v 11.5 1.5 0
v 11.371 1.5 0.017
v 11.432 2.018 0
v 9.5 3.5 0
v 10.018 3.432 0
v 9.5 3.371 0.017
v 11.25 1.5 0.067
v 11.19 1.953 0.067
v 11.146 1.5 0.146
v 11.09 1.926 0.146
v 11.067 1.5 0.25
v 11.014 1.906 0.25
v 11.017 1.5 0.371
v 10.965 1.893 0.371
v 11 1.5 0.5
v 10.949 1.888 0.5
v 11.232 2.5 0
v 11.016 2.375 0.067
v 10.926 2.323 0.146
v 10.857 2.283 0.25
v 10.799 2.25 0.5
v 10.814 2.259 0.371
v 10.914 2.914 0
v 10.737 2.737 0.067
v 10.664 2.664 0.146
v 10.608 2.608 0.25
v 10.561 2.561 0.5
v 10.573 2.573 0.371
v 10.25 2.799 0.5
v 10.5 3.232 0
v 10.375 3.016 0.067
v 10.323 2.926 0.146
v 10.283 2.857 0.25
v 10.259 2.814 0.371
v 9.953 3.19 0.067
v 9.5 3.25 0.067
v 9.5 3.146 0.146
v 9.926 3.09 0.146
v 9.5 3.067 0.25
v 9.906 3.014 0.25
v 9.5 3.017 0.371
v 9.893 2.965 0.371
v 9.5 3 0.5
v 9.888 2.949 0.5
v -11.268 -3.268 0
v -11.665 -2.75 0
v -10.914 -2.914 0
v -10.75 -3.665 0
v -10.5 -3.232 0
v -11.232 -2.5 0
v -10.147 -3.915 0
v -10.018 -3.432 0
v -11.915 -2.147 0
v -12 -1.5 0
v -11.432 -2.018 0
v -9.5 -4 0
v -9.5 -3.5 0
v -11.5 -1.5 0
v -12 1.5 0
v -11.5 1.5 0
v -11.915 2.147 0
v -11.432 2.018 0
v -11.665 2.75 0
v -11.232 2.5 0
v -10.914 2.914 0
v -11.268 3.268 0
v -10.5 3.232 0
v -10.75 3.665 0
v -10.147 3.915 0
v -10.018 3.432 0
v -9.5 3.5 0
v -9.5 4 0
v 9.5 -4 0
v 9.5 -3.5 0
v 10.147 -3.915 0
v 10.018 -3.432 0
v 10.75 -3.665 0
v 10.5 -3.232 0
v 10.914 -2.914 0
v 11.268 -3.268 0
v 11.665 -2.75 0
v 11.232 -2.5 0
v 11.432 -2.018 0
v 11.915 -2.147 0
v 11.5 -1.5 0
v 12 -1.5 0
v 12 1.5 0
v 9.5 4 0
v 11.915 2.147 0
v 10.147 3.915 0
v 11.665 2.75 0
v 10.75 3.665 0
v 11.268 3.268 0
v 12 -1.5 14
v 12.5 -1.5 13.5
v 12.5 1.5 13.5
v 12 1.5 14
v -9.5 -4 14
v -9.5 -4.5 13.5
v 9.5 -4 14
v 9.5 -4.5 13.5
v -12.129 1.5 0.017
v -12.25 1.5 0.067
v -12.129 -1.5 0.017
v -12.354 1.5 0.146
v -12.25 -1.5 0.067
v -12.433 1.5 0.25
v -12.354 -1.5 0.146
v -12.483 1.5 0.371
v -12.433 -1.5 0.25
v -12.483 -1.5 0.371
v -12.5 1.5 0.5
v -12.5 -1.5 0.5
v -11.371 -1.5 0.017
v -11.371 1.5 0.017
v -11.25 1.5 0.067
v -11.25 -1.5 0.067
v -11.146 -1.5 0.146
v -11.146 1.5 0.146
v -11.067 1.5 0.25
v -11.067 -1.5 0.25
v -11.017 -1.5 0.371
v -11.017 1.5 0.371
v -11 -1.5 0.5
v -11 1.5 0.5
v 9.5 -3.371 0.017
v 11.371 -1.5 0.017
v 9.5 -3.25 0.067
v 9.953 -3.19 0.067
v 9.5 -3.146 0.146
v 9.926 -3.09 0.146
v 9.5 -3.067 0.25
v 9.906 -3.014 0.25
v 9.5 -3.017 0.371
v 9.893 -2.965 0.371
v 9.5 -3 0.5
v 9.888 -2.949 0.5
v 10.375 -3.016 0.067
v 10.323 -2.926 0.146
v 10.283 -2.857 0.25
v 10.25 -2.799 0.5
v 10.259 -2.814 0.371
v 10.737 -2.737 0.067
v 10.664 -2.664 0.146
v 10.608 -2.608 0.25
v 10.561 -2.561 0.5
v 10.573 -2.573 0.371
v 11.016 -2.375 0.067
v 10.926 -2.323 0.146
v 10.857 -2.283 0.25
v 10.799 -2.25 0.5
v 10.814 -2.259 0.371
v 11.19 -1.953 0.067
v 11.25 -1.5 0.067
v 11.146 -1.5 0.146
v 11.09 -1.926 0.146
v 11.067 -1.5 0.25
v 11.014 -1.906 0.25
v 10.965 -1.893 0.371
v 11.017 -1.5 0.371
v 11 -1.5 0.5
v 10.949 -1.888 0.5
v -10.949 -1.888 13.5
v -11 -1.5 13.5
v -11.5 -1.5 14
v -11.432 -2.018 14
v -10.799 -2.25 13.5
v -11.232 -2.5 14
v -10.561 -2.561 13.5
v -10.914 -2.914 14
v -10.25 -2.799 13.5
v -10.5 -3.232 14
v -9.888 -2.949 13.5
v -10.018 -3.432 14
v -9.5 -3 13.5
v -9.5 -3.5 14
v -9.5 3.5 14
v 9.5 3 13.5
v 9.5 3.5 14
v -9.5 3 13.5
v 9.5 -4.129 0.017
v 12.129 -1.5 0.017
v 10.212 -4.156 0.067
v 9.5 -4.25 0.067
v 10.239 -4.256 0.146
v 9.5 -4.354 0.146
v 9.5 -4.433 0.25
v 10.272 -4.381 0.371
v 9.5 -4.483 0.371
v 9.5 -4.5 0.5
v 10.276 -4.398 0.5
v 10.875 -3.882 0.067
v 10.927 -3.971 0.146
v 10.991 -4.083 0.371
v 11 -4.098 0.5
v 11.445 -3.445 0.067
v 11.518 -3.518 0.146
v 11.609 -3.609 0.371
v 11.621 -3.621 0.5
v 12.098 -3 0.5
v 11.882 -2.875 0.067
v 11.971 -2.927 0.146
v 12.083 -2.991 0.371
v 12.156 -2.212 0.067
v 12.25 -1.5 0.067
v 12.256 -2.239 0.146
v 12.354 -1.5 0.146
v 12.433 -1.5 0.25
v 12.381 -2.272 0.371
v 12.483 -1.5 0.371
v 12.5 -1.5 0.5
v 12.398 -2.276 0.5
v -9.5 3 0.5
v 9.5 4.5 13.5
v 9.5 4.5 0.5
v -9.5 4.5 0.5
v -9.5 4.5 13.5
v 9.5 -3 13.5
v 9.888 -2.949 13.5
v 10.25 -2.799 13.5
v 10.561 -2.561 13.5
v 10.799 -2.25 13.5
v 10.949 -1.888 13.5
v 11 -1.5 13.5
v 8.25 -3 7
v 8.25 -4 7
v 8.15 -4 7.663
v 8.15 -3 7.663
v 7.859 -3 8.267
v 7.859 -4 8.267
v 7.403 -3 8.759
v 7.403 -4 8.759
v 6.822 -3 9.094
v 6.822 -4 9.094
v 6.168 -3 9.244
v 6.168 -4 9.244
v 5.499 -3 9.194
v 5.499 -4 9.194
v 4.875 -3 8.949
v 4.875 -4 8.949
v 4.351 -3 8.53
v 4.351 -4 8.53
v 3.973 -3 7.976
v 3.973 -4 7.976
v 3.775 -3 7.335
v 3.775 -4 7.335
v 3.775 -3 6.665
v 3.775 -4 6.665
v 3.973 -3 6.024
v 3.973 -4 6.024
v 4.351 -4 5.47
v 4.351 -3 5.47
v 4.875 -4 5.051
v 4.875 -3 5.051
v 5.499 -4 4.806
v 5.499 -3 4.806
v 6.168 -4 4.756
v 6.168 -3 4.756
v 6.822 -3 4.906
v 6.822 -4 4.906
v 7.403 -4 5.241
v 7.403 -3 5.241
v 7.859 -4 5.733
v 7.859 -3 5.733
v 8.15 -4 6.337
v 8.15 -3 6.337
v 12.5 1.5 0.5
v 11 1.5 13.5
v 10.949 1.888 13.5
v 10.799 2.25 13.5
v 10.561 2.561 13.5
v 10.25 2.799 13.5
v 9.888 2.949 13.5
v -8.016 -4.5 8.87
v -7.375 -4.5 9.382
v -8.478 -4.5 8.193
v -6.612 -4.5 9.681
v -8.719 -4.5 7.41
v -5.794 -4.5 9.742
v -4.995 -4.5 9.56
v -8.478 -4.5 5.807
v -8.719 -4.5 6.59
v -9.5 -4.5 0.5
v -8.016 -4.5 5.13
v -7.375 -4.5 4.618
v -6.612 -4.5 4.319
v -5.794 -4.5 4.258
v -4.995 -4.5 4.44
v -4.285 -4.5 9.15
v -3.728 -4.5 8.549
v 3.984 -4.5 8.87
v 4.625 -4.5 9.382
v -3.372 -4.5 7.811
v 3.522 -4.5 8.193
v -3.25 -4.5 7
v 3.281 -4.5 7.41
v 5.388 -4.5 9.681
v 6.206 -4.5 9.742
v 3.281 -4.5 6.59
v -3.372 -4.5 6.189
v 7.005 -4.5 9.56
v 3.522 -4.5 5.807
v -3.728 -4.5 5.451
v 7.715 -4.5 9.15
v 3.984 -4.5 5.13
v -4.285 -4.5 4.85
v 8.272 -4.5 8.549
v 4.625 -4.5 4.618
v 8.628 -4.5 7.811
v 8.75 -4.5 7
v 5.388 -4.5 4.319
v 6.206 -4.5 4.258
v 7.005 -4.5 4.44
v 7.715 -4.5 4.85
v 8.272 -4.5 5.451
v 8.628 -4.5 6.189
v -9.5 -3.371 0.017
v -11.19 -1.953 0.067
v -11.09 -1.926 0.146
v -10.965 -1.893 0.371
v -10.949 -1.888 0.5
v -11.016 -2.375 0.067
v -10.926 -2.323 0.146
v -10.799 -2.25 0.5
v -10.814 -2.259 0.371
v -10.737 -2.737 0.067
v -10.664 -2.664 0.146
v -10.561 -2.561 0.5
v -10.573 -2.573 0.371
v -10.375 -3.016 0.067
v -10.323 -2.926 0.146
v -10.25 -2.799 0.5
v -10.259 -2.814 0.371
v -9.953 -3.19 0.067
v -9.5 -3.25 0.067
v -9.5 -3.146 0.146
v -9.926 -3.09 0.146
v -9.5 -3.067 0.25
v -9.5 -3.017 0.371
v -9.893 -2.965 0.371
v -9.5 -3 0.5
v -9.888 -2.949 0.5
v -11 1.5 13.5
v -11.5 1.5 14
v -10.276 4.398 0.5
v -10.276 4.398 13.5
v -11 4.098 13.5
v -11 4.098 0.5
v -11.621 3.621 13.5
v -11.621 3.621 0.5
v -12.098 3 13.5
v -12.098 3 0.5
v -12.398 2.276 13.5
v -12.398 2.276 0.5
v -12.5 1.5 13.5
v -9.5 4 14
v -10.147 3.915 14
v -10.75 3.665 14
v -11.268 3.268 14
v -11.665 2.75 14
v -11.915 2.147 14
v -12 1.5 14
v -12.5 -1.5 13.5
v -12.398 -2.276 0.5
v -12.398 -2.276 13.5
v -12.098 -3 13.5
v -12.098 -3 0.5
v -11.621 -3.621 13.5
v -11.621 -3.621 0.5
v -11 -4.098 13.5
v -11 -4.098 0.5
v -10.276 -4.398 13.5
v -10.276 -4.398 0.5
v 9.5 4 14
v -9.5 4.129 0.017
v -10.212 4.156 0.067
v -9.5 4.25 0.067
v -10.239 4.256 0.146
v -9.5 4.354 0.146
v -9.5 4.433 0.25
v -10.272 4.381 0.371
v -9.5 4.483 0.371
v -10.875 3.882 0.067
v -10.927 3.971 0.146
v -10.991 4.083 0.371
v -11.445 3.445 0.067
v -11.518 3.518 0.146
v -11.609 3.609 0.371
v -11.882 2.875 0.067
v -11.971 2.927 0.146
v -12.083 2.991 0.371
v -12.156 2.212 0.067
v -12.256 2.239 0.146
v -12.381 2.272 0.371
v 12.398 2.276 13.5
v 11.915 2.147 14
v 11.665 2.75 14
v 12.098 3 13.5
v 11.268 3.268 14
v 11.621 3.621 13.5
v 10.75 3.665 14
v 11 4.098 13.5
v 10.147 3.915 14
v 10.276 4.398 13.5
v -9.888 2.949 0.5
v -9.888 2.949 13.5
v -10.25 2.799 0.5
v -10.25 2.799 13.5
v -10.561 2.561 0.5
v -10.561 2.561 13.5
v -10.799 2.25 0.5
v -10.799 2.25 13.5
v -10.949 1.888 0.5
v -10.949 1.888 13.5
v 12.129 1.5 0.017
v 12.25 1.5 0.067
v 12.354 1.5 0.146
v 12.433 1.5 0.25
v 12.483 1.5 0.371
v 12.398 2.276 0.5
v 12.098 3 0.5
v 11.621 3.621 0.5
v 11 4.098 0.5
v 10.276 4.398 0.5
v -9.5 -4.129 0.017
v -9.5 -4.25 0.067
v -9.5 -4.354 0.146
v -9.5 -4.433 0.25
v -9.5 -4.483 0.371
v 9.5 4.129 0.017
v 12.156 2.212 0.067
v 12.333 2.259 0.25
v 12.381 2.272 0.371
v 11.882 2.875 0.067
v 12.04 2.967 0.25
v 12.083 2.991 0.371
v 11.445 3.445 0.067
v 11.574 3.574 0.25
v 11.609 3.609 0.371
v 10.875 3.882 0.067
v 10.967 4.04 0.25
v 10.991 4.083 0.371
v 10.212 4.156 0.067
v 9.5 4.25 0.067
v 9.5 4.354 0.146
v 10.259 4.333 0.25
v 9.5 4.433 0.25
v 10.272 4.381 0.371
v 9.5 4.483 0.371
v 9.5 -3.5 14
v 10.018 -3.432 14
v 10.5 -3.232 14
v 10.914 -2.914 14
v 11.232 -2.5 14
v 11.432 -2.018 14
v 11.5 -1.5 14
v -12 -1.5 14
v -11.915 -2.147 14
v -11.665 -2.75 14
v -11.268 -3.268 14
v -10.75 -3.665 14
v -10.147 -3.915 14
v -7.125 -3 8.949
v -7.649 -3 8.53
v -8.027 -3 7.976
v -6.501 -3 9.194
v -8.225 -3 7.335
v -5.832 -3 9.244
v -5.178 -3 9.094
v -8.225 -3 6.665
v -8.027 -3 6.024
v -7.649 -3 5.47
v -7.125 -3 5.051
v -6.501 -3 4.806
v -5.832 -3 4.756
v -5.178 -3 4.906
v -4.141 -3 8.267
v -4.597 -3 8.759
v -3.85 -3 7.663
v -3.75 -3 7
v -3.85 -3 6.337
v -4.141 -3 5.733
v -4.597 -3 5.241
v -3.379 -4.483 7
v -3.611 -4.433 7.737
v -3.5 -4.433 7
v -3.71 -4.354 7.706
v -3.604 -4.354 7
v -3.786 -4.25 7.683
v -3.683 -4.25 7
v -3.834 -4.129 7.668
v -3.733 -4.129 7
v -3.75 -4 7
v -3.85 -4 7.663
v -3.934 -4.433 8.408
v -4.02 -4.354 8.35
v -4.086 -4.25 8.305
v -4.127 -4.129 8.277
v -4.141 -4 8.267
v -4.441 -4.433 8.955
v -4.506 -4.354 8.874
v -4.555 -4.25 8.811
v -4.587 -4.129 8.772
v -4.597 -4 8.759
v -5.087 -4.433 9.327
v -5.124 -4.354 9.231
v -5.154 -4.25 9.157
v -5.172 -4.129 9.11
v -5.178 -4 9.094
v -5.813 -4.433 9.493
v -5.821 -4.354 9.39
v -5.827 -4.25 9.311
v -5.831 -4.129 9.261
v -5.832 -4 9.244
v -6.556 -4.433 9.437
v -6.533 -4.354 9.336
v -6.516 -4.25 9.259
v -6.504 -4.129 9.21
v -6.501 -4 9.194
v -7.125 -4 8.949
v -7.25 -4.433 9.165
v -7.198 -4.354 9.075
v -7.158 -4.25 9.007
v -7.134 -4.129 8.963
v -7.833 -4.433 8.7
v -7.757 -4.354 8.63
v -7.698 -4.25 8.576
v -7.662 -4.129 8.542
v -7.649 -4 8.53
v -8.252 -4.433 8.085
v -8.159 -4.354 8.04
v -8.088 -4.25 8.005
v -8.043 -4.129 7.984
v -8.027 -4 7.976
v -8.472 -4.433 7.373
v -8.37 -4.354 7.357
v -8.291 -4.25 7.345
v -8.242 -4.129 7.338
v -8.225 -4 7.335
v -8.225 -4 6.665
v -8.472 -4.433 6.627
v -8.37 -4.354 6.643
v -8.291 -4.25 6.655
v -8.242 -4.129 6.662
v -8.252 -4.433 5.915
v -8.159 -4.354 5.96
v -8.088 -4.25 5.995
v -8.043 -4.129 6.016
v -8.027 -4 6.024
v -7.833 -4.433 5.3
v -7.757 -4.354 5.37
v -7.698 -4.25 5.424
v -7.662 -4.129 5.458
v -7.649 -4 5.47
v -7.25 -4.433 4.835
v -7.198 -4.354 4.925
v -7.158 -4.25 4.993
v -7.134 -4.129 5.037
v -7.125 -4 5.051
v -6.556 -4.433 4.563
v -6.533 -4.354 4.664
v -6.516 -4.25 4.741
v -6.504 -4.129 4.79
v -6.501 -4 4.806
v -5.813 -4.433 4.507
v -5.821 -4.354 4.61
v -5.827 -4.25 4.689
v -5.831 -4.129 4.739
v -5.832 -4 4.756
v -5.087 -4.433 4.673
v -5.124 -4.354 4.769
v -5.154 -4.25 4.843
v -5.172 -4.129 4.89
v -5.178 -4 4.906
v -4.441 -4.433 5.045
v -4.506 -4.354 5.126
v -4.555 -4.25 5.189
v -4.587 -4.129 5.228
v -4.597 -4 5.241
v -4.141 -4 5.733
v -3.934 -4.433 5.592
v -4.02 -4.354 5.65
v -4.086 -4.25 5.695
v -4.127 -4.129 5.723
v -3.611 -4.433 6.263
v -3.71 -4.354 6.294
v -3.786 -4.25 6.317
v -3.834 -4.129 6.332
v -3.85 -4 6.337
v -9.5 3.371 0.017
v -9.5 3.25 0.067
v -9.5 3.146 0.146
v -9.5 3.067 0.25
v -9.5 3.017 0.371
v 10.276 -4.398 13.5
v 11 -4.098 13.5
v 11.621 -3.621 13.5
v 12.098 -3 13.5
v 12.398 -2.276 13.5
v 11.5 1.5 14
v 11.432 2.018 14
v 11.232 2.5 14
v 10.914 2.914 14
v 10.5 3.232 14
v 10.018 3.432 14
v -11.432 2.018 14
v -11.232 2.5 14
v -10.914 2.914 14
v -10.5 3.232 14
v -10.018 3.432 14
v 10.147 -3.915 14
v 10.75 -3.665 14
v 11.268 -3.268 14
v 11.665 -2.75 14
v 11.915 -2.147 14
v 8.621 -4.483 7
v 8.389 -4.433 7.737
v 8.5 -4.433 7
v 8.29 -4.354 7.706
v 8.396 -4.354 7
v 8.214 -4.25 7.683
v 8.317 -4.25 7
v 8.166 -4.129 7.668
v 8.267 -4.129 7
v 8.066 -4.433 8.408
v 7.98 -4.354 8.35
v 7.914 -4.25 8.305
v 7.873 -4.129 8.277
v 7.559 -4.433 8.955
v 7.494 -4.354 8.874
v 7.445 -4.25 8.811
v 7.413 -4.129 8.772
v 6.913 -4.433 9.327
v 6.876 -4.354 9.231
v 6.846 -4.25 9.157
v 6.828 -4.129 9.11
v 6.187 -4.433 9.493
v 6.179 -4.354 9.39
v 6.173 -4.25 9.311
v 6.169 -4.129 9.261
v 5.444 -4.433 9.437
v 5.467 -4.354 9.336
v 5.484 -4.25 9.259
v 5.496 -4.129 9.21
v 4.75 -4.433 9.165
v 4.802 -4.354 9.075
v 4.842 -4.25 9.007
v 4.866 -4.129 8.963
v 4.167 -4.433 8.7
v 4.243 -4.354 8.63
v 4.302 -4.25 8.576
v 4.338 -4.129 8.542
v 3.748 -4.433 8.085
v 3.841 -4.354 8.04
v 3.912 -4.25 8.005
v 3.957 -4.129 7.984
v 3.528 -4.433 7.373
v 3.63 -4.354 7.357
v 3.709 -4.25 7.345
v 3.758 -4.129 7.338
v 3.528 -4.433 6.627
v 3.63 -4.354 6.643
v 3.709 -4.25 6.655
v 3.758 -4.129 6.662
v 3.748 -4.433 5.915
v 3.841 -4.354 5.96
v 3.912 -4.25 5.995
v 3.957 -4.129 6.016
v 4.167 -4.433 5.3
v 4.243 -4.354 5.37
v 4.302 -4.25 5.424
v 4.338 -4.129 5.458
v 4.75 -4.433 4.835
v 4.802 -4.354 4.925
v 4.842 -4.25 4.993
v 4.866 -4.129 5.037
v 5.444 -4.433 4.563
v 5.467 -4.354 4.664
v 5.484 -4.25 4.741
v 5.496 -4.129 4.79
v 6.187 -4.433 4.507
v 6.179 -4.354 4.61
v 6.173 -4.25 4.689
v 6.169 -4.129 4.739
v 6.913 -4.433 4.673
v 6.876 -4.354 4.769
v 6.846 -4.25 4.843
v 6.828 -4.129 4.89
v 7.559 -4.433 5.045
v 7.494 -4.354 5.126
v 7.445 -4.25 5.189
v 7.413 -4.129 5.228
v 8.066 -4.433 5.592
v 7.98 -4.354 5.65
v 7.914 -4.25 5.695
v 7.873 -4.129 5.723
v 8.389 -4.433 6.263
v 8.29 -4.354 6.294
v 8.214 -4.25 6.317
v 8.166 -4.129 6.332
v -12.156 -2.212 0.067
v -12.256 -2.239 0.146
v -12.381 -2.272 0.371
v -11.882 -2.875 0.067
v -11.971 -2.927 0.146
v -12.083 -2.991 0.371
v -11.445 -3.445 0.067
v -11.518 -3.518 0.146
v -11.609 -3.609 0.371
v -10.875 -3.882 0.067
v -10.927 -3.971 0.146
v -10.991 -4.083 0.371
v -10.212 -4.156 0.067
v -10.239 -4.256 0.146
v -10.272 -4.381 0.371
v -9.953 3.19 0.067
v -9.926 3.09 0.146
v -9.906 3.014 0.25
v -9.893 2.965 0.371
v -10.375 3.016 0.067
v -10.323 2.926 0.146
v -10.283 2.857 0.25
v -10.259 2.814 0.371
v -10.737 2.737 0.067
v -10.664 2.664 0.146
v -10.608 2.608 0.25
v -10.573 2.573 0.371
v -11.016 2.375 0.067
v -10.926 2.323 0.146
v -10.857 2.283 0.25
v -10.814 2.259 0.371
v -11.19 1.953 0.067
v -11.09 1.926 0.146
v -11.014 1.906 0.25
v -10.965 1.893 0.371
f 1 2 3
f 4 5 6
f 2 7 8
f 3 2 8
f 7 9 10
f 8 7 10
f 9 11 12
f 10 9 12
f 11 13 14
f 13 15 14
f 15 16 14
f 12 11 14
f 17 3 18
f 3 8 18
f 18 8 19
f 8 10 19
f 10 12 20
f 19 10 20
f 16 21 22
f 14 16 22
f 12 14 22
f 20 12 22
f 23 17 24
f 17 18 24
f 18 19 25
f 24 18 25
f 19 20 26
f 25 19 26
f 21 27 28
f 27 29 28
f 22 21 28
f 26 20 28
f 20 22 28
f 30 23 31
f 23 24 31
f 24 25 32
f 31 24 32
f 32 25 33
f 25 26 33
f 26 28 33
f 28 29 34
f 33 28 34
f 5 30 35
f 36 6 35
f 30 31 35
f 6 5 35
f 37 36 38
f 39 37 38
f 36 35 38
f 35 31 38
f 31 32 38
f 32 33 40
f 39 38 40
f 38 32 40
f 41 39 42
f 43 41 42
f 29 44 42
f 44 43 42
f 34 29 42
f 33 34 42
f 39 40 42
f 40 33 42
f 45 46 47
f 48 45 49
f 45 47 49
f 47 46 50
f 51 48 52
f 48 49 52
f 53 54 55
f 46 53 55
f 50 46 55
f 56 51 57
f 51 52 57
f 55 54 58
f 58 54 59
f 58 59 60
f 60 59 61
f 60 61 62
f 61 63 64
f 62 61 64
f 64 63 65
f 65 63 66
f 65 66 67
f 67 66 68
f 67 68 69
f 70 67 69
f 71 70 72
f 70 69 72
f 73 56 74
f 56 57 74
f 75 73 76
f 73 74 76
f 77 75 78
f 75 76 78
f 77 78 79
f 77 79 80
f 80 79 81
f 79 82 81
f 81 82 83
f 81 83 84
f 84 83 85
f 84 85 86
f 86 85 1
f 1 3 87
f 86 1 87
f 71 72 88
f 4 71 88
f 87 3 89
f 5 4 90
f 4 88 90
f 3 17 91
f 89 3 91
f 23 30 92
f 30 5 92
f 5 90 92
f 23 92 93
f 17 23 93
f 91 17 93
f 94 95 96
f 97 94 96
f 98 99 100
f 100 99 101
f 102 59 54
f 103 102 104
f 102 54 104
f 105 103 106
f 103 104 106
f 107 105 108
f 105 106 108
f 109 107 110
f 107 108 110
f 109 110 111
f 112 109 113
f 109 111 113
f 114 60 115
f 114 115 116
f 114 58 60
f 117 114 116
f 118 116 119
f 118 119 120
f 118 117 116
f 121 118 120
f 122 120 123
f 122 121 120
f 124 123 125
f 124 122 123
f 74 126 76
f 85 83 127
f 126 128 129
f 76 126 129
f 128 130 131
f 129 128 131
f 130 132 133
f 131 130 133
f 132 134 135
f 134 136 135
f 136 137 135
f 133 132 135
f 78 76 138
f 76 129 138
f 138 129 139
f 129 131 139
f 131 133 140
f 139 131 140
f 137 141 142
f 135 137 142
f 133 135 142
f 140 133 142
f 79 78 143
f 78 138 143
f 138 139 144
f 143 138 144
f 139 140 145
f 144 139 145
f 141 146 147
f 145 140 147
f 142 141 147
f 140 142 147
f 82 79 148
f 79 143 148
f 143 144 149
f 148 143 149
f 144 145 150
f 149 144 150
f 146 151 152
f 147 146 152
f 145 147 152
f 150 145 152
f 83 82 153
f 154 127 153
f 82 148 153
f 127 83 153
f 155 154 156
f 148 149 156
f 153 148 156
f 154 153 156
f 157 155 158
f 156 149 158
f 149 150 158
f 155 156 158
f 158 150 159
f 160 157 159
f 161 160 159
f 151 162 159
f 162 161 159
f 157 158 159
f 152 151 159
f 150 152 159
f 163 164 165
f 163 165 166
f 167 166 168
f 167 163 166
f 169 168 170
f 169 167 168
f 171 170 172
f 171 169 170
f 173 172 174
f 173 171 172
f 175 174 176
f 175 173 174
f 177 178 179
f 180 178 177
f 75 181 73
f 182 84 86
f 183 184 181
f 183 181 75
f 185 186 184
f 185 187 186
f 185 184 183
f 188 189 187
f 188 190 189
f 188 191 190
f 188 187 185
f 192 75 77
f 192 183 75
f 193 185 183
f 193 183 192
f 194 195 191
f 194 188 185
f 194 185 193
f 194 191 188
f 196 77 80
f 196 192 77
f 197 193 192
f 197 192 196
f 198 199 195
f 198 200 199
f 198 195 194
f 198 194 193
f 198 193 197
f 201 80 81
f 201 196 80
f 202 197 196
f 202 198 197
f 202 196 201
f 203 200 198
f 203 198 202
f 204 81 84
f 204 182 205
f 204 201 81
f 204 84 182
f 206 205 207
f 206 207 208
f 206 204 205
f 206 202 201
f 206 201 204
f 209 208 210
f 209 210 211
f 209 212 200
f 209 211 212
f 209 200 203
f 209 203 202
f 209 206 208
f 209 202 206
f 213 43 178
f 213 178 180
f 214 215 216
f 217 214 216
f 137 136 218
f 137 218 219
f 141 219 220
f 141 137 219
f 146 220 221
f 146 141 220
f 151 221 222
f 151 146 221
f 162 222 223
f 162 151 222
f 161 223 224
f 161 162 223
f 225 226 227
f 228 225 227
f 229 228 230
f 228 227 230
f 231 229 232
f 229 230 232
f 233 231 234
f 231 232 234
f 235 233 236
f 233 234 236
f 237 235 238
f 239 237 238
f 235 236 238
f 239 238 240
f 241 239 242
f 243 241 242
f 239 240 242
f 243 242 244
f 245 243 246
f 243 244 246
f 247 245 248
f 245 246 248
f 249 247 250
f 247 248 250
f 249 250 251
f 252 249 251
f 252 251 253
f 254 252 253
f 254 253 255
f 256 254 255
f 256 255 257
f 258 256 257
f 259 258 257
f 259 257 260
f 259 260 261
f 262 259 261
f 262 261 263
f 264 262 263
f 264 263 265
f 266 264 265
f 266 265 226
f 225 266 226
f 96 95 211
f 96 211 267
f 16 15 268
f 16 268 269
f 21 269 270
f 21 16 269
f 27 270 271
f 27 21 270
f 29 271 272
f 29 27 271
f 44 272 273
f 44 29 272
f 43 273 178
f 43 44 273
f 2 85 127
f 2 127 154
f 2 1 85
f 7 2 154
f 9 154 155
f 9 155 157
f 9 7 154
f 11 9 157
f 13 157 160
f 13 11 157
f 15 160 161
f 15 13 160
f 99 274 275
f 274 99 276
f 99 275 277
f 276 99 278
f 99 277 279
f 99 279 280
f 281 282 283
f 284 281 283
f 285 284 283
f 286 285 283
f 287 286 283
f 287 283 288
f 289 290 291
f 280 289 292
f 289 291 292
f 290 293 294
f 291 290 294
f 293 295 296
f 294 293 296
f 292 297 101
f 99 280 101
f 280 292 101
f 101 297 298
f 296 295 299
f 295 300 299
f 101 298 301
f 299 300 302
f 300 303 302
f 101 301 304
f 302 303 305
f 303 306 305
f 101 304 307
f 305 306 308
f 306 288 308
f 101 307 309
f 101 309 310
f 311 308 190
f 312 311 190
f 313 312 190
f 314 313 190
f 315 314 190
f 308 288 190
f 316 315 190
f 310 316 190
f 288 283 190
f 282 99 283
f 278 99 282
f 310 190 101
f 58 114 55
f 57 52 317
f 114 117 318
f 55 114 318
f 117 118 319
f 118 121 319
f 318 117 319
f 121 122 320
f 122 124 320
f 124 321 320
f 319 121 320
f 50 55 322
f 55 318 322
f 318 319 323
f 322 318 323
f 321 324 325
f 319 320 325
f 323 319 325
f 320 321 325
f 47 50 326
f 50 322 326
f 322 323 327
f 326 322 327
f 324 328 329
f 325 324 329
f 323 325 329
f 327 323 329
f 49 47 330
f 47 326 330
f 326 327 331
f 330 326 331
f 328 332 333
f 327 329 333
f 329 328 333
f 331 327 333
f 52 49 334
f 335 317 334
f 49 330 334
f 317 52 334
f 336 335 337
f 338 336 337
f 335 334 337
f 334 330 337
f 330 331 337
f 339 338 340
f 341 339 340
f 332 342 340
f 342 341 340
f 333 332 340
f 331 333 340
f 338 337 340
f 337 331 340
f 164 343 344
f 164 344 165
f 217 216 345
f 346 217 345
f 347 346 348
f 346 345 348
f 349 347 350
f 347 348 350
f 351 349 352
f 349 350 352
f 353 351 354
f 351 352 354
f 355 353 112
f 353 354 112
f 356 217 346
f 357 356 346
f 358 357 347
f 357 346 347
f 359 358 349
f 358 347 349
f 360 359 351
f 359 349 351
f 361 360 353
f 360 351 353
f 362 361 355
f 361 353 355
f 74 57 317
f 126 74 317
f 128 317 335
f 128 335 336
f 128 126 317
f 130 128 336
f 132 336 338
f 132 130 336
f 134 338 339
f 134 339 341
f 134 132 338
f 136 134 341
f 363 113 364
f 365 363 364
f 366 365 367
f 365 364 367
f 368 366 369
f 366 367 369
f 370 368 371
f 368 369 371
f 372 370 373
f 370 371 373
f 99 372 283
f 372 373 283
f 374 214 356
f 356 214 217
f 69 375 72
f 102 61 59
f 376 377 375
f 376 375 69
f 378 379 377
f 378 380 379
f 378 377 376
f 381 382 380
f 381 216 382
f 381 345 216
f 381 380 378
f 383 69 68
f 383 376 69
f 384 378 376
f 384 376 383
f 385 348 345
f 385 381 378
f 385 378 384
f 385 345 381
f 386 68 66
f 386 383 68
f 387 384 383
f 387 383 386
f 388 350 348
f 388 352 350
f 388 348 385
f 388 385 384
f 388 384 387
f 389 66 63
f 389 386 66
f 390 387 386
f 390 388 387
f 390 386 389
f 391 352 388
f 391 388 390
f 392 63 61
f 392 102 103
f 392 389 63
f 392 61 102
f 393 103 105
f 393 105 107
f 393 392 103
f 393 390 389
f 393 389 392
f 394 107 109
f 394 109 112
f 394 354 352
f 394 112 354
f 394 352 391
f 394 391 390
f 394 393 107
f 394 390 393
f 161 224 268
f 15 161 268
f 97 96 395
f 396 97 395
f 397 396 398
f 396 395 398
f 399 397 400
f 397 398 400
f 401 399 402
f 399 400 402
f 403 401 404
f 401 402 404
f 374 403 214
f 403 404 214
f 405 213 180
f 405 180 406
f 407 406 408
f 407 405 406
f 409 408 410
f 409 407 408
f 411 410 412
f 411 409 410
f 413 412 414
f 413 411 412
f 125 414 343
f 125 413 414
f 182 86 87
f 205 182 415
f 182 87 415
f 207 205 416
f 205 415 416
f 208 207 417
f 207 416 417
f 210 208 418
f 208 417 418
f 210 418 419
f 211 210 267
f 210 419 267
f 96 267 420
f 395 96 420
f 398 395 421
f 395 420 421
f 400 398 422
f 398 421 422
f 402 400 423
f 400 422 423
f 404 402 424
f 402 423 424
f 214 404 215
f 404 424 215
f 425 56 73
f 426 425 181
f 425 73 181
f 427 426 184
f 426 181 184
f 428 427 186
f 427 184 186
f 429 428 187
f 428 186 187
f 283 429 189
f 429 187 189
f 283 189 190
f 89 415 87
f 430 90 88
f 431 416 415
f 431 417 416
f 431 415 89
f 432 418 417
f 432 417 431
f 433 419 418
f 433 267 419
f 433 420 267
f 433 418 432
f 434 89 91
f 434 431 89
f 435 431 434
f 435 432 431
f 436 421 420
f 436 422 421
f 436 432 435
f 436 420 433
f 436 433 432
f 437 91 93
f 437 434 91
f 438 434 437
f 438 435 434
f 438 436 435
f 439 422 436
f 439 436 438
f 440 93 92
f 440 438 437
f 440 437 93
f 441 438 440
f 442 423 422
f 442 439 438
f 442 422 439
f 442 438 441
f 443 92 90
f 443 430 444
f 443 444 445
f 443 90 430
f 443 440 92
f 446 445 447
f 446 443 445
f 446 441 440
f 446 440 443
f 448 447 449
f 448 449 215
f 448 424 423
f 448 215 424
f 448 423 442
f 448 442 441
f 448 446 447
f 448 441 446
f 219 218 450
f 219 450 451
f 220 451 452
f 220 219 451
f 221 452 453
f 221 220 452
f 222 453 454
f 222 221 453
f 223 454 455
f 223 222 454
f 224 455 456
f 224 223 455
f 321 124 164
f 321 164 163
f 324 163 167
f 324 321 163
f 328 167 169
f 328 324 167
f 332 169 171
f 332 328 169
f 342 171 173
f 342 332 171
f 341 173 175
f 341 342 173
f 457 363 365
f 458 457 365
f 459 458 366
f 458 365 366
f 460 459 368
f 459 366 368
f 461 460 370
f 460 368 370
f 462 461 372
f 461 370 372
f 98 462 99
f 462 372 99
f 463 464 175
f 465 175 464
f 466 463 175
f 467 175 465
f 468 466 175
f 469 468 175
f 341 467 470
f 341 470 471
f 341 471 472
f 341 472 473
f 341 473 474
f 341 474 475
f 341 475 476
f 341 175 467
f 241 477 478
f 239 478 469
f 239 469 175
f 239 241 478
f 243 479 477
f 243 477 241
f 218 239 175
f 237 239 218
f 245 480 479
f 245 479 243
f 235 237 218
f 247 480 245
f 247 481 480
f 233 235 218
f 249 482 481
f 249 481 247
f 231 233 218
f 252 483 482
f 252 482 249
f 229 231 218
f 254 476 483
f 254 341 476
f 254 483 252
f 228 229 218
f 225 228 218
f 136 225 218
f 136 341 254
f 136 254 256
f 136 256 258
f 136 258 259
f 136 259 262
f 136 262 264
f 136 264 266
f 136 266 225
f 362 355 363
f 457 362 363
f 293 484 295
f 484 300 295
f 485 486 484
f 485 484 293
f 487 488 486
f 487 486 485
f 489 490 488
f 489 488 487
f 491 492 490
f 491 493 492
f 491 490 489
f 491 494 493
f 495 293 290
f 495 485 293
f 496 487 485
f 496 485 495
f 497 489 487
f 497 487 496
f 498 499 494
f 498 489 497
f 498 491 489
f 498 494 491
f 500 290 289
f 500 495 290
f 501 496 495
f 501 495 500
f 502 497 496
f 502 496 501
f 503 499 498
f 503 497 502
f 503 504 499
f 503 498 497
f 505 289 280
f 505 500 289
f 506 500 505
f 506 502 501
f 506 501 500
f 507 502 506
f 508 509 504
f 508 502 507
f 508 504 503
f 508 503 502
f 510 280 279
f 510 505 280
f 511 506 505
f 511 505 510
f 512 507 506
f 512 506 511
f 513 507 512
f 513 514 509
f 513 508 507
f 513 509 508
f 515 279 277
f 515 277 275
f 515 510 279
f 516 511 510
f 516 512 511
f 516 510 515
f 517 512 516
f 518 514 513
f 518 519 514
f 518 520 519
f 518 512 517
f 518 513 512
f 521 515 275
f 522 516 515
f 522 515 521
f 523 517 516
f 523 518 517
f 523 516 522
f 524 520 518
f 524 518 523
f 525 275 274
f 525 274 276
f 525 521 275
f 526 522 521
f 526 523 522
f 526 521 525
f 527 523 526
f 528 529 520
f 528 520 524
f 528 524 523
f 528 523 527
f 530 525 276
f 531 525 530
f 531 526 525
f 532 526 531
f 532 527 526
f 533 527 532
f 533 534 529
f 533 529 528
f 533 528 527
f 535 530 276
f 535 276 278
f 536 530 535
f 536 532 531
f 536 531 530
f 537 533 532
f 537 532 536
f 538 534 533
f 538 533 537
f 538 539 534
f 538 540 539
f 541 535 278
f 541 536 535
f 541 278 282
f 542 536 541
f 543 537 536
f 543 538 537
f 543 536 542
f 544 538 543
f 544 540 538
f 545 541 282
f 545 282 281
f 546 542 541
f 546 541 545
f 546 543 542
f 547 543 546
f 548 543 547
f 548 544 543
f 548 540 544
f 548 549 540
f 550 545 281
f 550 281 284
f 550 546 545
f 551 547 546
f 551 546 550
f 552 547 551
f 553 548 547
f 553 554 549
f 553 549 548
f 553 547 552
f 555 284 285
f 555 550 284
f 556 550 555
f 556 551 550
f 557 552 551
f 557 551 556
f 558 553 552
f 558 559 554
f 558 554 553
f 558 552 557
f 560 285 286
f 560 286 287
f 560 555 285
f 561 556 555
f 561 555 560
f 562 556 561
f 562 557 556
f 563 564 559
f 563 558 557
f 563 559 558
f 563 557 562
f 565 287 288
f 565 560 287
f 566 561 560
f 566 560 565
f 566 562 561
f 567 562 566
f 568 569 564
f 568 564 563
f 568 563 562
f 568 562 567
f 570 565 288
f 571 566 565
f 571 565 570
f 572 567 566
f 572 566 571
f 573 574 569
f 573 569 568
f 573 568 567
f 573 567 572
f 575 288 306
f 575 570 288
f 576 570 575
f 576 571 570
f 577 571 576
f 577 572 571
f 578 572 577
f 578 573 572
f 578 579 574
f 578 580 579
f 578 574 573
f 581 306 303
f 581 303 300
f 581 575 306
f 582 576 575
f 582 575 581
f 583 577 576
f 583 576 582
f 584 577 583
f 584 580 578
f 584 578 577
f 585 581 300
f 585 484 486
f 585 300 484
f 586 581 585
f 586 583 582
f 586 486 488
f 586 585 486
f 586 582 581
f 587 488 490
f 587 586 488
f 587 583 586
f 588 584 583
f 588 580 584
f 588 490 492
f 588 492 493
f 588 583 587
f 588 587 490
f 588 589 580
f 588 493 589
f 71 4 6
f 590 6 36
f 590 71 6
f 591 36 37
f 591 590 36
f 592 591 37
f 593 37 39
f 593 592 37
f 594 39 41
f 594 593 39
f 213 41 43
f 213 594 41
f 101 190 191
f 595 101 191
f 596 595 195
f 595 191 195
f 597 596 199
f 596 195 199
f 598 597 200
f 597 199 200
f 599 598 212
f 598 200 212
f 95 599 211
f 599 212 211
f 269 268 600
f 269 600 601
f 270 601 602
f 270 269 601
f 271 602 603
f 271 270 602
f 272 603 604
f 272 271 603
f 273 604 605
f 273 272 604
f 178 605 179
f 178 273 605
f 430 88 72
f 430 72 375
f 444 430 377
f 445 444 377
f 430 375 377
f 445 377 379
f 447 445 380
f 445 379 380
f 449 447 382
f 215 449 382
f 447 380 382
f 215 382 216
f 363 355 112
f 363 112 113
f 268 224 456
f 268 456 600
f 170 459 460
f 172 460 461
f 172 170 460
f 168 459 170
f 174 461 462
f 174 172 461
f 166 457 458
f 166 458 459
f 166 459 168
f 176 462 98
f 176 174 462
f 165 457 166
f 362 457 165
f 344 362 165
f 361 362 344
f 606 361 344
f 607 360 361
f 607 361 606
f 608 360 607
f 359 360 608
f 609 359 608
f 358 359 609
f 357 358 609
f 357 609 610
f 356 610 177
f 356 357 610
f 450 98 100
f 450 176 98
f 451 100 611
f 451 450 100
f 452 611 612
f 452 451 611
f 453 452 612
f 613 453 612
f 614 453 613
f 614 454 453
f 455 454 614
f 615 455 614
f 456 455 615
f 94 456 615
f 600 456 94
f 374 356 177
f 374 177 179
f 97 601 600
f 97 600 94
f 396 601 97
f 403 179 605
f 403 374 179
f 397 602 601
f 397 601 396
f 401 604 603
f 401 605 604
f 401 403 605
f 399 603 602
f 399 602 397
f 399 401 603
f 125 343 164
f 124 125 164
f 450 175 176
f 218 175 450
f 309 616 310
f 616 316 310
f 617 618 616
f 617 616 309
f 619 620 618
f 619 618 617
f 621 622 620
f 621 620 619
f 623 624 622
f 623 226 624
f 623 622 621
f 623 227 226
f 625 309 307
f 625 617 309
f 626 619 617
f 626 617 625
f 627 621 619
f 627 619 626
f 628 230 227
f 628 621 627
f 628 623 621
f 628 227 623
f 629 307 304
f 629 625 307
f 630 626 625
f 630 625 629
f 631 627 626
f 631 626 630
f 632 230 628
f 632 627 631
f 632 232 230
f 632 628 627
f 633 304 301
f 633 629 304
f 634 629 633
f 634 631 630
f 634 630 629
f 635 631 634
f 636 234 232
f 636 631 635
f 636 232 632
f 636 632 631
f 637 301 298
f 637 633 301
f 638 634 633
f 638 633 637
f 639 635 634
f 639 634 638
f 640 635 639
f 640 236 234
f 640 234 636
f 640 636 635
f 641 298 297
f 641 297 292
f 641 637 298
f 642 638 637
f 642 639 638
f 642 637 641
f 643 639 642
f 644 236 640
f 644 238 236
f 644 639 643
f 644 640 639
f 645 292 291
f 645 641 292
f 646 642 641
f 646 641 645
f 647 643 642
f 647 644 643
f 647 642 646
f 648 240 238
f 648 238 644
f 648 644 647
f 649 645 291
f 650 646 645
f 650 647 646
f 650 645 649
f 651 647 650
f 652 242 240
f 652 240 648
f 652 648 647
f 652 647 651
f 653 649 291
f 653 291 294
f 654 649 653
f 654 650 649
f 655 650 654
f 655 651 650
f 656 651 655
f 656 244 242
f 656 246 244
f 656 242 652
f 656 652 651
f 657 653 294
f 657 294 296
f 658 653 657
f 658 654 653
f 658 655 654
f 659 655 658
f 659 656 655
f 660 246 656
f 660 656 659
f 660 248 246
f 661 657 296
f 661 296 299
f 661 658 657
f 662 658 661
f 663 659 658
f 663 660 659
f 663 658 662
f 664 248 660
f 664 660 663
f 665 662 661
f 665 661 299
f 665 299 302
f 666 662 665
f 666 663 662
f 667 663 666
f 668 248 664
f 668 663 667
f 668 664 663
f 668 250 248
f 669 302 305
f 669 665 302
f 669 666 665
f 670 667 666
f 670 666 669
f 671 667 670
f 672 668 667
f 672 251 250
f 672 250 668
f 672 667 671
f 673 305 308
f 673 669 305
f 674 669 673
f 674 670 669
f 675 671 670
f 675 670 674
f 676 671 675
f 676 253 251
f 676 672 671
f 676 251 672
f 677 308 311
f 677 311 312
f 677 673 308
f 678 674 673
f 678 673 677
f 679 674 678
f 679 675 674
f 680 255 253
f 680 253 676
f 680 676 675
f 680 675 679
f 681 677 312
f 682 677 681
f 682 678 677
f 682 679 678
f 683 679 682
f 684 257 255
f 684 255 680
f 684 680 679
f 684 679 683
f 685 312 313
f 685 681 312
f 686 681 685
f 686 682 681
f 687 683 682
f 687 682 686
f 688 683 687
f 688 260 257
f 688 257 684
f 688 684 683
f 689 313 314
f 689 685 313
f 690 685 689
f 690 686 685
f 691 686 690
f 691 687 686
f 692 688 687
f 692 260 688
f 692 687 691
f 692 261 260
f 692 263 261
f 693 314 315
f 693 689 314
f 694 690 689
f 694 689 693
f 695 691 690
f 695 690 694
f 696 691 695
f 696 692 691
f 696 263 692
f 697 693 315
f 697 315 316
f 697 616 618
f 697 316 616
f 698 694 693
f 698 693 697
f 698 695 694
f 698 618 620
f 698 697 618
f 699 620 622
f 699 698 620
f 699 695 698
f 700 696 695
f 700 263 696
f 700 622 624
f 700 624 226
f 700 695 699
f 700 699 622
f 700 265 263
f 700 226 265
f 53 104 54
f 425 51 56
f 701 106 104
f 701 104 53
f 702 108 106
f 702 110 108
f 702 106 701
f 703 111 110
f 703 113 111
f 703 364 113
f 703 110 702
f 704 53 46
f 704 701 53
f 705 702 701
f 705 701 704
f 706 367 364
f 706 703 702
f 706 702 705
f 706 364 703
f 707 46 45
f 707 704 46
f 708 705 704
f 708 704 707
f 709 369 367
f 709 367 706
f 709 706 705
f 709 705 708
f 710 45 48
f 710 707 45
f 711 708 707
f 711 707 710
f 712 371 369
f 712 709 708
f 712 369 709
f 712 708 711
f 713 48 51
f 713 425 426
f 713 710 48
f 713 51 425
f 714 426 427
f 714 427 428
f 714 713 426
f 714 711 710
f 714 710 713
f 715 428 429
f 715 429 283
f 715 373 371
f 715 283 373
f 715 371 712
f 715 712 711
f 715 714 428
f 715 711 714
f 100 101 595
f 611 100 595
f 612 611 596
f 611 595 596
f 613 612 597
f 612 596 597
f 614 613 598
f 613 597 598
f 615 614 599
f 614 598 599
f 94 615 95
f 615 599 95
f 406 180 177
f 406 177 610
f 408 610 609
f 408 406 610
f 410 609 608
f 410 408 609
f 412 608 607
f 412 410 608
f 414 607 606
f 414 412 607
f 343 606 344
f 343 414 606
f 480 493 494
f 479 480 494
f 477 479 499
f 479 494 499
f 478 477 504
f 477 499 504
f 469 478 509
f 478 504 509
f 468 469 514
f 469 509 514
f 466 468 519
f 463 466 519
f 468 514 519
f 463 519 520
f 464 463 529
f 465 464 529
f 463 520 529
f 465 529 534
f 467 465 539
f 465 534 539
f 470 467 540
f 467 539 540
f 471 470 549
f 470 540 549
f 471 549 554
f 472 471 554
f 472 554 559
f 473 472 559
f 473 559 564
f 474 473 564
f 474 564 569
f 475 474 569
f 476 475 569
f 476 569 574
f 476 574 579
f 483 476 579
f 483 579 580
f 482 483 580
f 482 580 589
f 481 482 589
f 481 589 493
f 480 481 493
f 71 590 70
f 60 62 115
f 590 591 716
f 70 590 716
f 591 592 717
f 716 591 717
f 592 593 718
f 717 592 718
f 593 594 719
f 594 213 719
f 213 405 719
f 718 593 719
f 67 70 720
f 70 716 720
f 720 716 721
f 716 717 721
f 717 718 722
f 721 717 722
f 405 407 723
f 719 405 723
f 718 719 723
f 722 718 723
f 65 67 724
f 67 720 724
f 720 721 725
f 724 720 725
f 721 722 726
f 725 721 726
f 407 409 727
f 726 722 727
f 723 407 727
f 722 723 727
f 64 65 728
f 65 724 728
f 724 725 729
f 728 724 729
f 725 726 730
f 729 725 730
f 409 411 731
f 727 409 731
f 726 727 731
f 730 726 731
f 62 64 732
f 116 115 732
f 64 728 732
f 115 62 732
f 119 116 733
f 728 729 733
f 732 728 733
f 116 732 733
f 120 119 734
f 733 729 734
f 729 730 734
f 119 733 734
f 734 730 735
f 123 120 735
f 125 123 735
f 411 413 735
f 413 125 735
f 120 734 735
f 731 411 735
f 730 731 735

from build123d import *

# Parameters (mm, degrees)
F1_DEPTH = 14
F2_T     = -1.5
F3_R     = 2.25
F4_DEPTH = 5
F5_R     = 0.5
F6_SIZE  = 0.5


with BuildPart() as f1:
    # F0 (on Top) → F1 (new body)
    with BuildSketch(Plane.XY):
        with BuildLine():
            ThreePointArc((-12.5, -1.5), (-11.6213203436, -3.6213203436), (-9.5, -4.5))
            Line((-9.5, -4.5), (9.5, -4.5))
            ThreePointArc((9.5, -4.5), (11.6213203436, -3.6213203436), (12.5, -1.5))
            Line((12.5, -1.5), (12.5, 1.5))
            ThreePointArc((12.5, 1.5), (11.6213203436, 3.6213203436), (9.5, 4.5))
            Line((9.5, 4.5), (-9.5, 4.5))
            ThreePointArc((-9.5, 4.5), (-11.6213203436, 3.6213203436), (-12.5, 1.5))
            Line((-12.5, 1.5), (-12.5, -1.5))
        make_face()
    extrude(amount=F1_DEPTH)

    # F2
    f2_openings = [f1.faces().sort_by_distance(p)[0] for p in [
        (0, 0, 14),
        (0, 0, 0),
    ]]
    offset(amount=F2_T, openings=f2_openings)

    # F3 (on face) → F4 (cut)
    with BuildSketch(Plane.XZ.offset(4.5)):
        with Locations((-6, 7)):
            Circle(F3_R)
        with Locations((6, 7)):
            Circle(F3_R)
    extrude(amount=-F4_DEPTH, mode=Mode.SUBTRACT)

    # F5
    f5_edges = [f1.edges().sort_by_distance(p)[0] for p in [
        (0, 4.5, 0),
        (0, -3, 0),
        (3.75, -4.5, 7),
        (-8.25, -4.5, 7),
    ]]
    fillet(f5_edges, radius=F5_R)

    # F6
    f6_edges = [f1.edges().sort_by_distance(p)[0] for p in [
        (0, -4.5, 14),
        (0, -3, 14),
    ]]
    chamfer(f6_edges, length=F6_SIZE)


solid = f1.part
